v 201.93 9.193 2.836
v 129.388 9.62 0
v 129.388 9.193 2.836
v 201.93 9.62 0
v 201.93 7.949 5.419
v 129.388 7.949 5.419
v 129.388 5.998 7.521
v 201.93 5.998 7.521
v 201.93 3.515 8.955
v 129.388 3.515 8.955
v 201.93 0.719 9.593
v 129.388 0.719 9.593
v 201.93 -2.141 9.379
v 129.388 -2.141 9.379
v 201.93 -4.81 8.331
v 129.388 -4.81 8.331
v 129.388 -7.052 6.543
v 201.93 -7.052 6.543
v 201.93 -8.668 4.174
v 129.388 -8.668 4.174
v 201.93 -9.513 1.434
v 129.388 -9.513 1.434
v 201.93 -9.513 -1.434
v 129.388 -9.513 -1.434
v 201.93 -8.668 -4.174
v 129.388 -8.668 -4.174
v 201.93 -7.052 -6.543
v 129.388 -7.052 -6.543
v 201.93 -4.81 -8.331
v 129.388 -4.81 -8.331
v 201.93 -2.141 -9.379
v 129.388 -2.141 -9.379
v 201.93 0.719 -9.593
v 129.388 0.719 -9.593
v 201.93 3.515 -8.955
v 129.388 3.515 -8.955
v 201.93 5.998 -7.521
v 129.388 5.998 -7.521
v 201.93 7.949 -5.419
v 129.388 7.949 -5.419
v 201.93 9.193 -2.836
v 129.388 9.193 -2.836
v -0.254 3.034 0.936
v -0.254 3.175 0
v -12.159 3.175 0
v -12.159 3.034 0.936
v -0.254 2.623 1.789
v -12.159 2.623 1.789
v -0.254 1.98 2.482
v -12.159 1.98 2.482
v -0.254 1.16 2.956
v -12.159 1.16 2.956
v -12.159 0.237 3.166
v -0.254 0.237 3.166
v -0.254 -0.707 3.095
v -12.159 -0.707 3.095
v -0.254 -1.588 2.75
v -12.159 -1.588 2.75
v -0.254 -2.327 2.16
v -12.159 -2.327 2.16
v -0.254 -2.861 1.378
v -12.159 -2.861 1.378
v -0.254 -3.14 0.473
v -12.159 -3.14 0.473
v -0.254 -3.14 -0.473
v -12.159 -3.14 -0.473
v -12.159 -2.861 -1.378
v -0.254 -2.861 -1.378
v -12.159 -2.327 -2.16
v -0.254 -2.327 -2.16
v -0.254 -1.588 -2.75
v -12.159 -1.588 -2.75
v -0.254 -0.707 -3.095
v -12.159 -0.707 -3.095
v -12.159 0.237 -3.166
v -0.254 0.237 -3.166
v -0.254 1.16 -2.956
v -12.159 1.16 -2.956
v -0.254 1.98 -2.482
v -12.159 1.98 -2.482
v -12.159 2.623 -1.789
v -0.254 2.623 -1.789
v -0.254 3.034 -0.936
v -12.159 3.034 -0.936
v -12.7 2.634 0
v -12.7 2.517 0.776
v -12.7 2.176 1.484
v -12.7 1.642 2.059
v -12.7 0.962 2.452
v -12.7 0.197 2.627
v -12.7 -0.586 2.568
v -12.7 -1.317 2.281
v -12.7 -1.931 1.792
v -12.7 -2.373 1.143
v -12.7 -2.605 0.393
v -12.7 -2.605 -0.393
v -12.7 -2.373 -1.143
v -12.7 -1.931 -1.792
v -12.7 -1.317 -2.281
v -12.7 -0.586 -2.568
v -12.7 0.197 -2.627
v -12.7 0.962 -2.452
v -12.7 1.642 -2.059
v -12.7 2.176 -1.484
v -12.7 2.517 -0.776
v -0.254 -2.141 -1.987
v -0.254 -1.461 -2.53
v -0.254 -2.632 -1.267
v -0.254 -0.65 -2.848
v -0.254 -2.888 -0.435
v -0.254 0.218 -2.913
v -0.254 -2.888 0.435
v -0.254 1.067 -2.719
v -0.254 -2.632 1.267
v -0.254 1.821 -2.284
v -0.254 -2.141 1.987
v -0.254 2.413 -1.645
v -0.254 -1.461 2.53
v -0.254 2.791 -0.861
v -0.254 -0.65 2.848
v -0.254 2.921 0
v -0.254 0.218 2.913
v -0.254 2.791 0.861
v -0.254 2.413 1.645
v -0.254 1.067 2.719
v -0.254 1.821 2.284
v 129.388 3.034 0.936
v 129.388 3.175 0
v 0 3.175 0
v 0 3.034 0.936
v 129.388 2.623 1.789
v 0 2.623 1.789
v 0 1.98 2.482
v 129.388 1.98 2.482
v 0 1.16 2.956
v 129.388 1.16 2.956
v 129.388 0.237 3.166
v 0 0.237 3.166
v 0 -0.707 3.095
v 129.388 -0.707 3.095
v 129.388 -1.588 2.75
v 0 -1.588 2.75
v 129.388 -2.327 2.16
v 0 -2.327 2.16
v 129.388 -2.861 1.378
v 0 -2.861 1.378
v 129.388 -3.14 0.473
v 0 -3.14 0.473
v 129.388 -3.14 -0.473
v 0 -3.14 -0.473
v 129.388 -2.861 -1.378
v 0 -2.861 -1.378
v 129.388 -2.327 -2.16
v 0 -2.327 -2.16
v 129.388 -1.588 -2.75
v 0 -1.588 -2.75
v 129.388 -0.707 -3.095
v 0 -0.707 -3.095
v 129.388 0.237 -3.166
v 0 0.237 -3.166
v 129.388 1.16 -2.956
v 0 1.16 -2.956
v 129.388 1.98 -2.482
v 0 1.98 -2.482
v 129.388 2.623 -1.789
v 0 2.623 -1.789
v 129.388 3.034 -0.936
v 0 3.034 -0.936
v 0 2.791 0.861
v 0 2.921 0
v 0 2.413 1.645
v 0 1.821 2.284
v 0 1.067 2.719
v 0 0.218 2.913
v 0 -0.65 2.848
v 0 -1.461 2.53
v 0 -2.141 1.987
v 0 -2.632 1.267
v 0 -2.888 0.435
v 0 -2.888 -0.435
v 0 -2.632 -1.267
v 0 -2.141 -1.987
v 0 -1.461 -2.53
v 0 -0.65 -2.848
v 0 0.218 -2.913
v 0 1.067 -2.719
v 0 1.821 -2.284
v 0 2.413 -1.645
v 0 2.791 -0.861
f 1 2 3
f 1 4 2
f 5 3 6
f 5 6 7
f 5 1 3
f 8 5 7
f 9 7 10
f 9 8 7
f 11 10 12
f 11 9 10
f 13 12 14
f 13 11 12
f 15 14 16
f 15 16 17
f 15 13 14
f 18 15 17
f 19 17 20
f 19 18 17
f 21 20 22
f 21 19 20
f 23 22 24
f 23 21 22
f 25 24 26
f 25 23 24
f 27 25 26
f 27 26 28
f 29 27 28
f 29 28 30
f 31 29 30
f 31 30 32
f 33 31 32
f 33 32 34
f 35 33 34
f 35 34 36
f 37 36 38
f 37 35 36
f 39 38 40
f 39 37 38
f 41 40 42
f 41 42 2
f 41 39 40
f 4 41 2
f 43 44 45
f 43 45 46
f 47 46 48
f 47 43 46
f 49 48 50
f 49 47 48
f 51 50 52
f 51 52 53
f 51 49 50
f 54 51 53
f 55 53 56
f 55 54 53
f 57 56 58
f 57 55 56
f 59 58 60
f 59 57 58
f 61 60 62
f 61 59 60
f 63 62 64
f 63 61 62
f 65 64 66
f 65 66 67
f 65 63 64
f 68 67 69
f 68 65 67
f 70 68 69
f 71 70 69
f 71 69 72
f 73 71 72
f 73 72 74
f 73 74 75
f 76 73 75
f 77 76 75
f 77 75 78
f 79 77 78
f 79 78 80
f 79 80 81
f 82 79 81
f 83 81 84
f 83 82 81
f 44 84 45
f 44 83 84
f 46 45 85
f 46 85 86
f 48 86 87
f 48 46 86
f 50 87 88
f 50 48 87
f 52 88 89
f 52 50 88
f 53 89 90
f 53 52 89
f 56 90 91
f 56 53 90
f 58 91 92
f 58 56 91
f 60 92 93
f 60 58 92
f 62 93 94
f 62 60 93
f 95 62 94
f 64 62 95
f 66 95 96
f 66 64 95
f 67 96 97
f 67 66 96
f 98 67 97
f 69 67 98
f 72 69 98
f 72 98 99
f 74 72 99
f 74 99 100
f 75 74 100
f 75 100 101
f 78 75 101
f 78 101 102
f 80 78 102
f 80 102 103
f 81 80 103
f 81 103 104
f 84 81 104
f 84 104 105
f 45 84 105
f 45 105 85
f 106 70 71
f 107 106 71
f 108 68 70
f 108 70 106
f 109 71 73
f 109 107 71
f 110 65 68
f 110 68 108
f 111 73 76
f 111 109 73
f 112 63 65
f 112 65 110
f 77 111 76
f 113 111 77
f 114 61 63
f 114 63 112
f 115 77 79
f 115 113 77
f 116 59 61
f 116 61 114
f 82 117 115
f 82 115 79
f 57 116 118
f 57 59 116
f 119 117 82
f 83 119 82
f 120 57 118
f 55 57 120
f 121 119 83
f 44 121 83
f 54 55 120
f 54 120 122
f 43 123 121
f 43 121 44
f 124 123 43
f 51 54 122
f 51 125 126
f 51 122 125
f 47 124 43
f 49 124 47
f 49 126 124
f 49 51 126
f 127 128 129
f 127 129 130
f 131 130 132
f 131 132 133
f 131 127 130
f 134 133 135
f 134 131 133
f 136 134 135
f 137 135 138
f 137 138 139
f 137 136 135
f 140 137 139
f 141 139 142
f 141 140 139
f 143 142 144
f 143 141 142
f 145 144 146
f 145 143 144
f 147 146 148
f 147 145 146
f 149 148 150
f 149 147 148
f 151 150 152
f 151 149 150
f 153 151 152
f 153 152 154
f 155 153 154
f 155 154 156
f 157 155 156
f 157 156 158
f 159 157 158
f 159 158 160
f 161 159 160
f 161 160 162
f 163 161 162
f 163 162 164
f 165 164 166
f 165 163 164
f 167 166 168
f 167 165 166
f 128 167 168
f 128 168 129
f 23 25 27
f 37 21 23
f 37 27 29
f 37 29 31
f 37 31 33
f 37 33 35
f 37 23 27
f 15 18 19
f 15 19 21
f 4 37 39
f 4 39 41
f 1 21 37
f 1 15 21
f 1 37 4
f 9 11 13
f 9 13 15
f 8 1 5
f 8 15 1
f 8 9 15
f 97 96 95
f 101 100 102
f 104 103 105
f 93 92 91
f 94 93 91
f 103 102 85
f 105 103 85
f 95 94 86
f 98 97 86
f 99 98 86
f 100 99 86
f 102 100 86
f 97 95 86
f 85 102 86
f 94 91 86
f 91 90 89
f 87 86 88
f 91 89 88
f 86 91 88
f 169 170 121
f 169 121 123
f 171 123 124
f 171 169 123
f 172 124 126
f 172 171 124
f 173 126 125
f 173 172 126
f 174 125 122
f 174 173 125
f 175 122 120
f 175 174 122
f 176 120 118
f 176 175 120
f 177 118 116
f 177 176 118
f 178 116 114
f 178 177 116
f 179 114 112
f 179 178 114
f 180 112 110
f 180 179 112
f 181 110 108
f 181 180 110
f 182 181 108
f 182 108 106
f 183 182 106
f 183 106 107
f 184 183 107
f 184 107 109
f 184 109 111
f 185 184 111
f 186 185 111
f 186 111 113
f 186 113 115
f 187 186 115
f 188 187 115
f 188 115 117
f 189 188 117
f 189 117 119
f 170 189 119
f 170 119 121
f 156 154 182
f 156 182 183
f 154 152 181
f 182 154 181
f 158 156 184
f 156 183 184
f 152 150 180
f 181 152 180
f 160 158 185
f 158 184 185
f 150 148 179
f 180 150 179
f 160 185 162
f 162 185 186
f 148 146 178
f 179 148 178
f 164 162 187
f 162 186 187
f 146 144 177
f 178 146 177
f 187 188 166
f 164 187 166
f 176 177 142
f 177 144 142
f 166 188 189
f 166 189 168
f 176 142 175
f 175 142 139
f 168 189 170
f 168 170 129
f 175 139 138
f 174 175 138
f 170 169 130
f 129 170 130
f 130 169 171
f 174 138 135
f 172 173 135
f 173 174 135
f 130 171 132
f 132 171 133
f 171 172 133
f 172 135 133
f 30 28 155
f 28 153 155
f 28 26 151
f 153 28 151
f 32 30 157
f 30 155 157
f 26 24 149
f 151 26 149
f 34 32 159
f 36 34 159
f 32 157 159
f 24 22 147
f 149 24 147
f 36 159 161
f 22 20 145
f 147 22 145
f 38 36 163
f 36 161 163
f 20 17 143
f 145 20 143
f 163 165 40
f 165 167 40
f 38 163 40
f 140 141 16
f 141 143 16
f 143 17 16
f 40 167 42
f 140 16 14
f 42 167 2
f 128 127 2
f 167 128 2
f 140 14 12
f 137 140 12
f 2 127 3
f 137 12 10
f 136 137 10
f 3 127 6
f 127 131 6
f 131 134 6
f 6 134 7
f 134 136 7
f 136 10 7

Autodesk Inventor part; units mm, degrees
sketch "Sketch_1" plane through (0, 0, 0) normal (0, 0, 1) x (1, 0, 0)
  line L0 (201.93, 0) -> (0, 0)
  line L1 (0, 0) -> (0, 3.175)
  line L2 (0, 3.175) -> (129.3876, 3.175)
  line L3 (129.3876, 3.175) -> (129.3876, 9.6202)
  line L4 (129.3876, 9.6202) -> (201.93, 9.6202)
  line L5 (201.93, 9.6202) -> (201.93, 0)
  line L6 (201.93, 0) -> (0, 0)
revolve "Revolution1" add sketch "Sketch_1" angle 360 about axis through (201.93, 0, 0) along (1, 0, 0)
sketch "Sketch_3" plane through (0, 0, 0) normal (0, 0, 1) x (1, 0, 0)
  line L0 (0, 0) -> (-12.7, 0)
  line L1 (-12.7, 0) -> (-12.7, 2.634)
  line L2 (-12.7, 2.634) -> (-12.159, 3.175)
  line L3 (-12.159, 3.175) -> (0, 3.175)
  line L4 (0, 3.175) -> (0, 0)
  line L5 (0, 0) -> (-12.7, 0)
revolve "Revolution2" add sketch "Sketch_3" angle 360 about axis through (0, 0, 0) along (1, 0, 0)
sketch "Sketch_30" plane through (0, 0, 0) normal (0, 0, 1) x (1, 0, 0)
  line L0 (0, 0) -> (-0.254, 0)
  line L1 (-0.254, 2.921) -> (0, 2.921)
  line L2 (0, 2.921) -> (0, 3.429)
  line L3 (0, 3.429) -> (-0.254, 3.429)
  line L4 (-0.254, 3.429) -> (-0.254, 2.921)
revolve "Revolution3" cut sketch "Sketch_30" angle 360 about axis through (0, 0, 0) along (1, 0, 0)
ref_plane "dia1_XY" through (0, 3.175, 0) normal (1, 0, 0) x (0, 0, -1)
ref_plane "dia1_YZ" through (0, 3.175, 0) normal (0, 0, -1) x (0, 1, 0)
ref_plane "dia1_ZX" through (0, 3.175, 0) normal (0, 1, 0) x (1, 0, 0)
ref_plane "dia12_XY" through (0, 0, 10.9537) normal (1, 0, 0) x (0, 0, -1)
ref_plane "dia12_YZ" through (0, 0, 10.9537) normal (0, 0, -1) x (0, 1, 0)
ref_plane "dia12_ZX" through (0, 0, 10.9537) normal (0, 1, 0) x (1, 0, 0)
ref_plane "dia1r_XY" through (0, 0, 10.2235) normal (1, 0, 0) x (0, 0, -1)
ref_plane "dia1r_YZ" through (0, 0, 10.2235) normal (0, 0, -1) x (0, 1, 0)
ref_plane "dia1r_ZX" through (0, 0, 10.2235) normal (0, 1, 0) x (1, 0, 0)
ref_plane "dia2_XY" through (0, -3.175, 0) normal (1, 0, 0) x (0, 0, -1)
ref_plane "dia2_YZ" through (0, -3.175, 0) normal (0, 0, -1) x (0, 1, 0)
ref_plane "dia2_ZX" through (0, -3.175, 0) normal (0, 1, 0) x (1, 0, 0)
ref_plane "dia22_XY" through (0, 0, -10.9537) normal (1, 0, 0) x (0, 0, -1)
ref_plane "dia22_YZ" through (0, 0, -10.9537) normal (0, 0, -1) x (0, 1, 0)
ref_plane "dia22_ZX" through (0, 0, -10.9537) normal (0, 1, 0) x (1, 0, 0)
ref_plane "dia2r_XY" through (0, 0, -10.2235) normal (1, 0, 0) x (0, 0, -1)
ref_plane "dia2r_YZ" through (0, 0, -10.2235) normal (0, 0, -1) x (0, 1, 0)
ref_plane "dia2r_ZX" through (0, 0, -10.2235) normal (0, 1, 0) x (1, 0, 0)
ref_plane "rl1_XY" through (-12.7, 0, 0) normal (1, 0, 0) x (0, 0, -1)
ref_plane "rl1_YZ" through (-12.7, 0, 0) normal (0, 0, -1) x (0, 1, 0)
ref_plane "rl1_ZX" through (-12.7, 0, 0) normal (0, 1, 0) x (1, 0, 0)
ref_plane "rl2_XY" through (0, 0, 0) normal (1, 0, 0) x (0, 0, -1)
ref_plane "rl2_YZ" through (0, 0, 0) normal (0, 0, -1) x (0, 1, 0)
ref_plane "rl2_ZX" through (0, 0, 0) normal (0, 1, 0) x (1, 0, 0)
ref_plane "rod_cp_XY" through (0, 0, 0) normal (1, 0, 0) x (0, 0, -1)
ref_plane "rod_cp_YZ" through (0, 0, 0) normal (0, 0, -1) x (0, 1, 0)
ref_plane "rod_cp_ZX" through (0, 0, 0) normal (0, 1, 0) x (1, 0, 0)
ref_plane "stroke1_XY" through (0, 0, 0) normal (1, 0, 0) x (0, 0, -1)
ref_plane "stroke1_YZ" through (0, 0, 0) normal (0, 0, -1) x (0, 1, 0)
ref_plane "stroke1_ZX" through (0, 0, 0) normal (0, 1, 0) x (1, 0, 0)
ref_plane "thd1_XY" through (-12.7, 3.175, 0) normal (1, 0, 0) x (0, 0, -1)
ref_plane "thd1_YZ" through (-12.7, 3.175, 0) normal (0, 0, -1) x (0, 1, 0)
ref_plane "thd1_ZX" through (-12.7, 3.175, 0) normal (0, 1, 0) x (1, 0, 0)
ref_plane "thd2_XY" through (-12.7, -3.175, 0) normal (1, 0, 0) x (0, 0, -1)
ref_plane "thd2_YZ" through (-12.7, -3.175, 0) normal (0, 0, -1) x (0, 1, 0)
ref_plane "thd2_ZX" through (-12.7, -3.175, 0) normal (0, 1, 0) x (1, 0, 0)
ref_plane "to_rod_clevis_XY" through (-16.764, 0, 0) normal (1, 0, 0) x (0, 0, -1)
ref_plane "to_rod_clevis_YZ" through (-16.764, 0, 0) normal (0, 0, -1) x (0, 1, 0)
ref_plane "to_rod_clevis_ZX" through (-16.764, 0, 0) normal (0, 1, 0) x (1, 0, 0)
properties part number "C-043.5-HRP0000_rod"
